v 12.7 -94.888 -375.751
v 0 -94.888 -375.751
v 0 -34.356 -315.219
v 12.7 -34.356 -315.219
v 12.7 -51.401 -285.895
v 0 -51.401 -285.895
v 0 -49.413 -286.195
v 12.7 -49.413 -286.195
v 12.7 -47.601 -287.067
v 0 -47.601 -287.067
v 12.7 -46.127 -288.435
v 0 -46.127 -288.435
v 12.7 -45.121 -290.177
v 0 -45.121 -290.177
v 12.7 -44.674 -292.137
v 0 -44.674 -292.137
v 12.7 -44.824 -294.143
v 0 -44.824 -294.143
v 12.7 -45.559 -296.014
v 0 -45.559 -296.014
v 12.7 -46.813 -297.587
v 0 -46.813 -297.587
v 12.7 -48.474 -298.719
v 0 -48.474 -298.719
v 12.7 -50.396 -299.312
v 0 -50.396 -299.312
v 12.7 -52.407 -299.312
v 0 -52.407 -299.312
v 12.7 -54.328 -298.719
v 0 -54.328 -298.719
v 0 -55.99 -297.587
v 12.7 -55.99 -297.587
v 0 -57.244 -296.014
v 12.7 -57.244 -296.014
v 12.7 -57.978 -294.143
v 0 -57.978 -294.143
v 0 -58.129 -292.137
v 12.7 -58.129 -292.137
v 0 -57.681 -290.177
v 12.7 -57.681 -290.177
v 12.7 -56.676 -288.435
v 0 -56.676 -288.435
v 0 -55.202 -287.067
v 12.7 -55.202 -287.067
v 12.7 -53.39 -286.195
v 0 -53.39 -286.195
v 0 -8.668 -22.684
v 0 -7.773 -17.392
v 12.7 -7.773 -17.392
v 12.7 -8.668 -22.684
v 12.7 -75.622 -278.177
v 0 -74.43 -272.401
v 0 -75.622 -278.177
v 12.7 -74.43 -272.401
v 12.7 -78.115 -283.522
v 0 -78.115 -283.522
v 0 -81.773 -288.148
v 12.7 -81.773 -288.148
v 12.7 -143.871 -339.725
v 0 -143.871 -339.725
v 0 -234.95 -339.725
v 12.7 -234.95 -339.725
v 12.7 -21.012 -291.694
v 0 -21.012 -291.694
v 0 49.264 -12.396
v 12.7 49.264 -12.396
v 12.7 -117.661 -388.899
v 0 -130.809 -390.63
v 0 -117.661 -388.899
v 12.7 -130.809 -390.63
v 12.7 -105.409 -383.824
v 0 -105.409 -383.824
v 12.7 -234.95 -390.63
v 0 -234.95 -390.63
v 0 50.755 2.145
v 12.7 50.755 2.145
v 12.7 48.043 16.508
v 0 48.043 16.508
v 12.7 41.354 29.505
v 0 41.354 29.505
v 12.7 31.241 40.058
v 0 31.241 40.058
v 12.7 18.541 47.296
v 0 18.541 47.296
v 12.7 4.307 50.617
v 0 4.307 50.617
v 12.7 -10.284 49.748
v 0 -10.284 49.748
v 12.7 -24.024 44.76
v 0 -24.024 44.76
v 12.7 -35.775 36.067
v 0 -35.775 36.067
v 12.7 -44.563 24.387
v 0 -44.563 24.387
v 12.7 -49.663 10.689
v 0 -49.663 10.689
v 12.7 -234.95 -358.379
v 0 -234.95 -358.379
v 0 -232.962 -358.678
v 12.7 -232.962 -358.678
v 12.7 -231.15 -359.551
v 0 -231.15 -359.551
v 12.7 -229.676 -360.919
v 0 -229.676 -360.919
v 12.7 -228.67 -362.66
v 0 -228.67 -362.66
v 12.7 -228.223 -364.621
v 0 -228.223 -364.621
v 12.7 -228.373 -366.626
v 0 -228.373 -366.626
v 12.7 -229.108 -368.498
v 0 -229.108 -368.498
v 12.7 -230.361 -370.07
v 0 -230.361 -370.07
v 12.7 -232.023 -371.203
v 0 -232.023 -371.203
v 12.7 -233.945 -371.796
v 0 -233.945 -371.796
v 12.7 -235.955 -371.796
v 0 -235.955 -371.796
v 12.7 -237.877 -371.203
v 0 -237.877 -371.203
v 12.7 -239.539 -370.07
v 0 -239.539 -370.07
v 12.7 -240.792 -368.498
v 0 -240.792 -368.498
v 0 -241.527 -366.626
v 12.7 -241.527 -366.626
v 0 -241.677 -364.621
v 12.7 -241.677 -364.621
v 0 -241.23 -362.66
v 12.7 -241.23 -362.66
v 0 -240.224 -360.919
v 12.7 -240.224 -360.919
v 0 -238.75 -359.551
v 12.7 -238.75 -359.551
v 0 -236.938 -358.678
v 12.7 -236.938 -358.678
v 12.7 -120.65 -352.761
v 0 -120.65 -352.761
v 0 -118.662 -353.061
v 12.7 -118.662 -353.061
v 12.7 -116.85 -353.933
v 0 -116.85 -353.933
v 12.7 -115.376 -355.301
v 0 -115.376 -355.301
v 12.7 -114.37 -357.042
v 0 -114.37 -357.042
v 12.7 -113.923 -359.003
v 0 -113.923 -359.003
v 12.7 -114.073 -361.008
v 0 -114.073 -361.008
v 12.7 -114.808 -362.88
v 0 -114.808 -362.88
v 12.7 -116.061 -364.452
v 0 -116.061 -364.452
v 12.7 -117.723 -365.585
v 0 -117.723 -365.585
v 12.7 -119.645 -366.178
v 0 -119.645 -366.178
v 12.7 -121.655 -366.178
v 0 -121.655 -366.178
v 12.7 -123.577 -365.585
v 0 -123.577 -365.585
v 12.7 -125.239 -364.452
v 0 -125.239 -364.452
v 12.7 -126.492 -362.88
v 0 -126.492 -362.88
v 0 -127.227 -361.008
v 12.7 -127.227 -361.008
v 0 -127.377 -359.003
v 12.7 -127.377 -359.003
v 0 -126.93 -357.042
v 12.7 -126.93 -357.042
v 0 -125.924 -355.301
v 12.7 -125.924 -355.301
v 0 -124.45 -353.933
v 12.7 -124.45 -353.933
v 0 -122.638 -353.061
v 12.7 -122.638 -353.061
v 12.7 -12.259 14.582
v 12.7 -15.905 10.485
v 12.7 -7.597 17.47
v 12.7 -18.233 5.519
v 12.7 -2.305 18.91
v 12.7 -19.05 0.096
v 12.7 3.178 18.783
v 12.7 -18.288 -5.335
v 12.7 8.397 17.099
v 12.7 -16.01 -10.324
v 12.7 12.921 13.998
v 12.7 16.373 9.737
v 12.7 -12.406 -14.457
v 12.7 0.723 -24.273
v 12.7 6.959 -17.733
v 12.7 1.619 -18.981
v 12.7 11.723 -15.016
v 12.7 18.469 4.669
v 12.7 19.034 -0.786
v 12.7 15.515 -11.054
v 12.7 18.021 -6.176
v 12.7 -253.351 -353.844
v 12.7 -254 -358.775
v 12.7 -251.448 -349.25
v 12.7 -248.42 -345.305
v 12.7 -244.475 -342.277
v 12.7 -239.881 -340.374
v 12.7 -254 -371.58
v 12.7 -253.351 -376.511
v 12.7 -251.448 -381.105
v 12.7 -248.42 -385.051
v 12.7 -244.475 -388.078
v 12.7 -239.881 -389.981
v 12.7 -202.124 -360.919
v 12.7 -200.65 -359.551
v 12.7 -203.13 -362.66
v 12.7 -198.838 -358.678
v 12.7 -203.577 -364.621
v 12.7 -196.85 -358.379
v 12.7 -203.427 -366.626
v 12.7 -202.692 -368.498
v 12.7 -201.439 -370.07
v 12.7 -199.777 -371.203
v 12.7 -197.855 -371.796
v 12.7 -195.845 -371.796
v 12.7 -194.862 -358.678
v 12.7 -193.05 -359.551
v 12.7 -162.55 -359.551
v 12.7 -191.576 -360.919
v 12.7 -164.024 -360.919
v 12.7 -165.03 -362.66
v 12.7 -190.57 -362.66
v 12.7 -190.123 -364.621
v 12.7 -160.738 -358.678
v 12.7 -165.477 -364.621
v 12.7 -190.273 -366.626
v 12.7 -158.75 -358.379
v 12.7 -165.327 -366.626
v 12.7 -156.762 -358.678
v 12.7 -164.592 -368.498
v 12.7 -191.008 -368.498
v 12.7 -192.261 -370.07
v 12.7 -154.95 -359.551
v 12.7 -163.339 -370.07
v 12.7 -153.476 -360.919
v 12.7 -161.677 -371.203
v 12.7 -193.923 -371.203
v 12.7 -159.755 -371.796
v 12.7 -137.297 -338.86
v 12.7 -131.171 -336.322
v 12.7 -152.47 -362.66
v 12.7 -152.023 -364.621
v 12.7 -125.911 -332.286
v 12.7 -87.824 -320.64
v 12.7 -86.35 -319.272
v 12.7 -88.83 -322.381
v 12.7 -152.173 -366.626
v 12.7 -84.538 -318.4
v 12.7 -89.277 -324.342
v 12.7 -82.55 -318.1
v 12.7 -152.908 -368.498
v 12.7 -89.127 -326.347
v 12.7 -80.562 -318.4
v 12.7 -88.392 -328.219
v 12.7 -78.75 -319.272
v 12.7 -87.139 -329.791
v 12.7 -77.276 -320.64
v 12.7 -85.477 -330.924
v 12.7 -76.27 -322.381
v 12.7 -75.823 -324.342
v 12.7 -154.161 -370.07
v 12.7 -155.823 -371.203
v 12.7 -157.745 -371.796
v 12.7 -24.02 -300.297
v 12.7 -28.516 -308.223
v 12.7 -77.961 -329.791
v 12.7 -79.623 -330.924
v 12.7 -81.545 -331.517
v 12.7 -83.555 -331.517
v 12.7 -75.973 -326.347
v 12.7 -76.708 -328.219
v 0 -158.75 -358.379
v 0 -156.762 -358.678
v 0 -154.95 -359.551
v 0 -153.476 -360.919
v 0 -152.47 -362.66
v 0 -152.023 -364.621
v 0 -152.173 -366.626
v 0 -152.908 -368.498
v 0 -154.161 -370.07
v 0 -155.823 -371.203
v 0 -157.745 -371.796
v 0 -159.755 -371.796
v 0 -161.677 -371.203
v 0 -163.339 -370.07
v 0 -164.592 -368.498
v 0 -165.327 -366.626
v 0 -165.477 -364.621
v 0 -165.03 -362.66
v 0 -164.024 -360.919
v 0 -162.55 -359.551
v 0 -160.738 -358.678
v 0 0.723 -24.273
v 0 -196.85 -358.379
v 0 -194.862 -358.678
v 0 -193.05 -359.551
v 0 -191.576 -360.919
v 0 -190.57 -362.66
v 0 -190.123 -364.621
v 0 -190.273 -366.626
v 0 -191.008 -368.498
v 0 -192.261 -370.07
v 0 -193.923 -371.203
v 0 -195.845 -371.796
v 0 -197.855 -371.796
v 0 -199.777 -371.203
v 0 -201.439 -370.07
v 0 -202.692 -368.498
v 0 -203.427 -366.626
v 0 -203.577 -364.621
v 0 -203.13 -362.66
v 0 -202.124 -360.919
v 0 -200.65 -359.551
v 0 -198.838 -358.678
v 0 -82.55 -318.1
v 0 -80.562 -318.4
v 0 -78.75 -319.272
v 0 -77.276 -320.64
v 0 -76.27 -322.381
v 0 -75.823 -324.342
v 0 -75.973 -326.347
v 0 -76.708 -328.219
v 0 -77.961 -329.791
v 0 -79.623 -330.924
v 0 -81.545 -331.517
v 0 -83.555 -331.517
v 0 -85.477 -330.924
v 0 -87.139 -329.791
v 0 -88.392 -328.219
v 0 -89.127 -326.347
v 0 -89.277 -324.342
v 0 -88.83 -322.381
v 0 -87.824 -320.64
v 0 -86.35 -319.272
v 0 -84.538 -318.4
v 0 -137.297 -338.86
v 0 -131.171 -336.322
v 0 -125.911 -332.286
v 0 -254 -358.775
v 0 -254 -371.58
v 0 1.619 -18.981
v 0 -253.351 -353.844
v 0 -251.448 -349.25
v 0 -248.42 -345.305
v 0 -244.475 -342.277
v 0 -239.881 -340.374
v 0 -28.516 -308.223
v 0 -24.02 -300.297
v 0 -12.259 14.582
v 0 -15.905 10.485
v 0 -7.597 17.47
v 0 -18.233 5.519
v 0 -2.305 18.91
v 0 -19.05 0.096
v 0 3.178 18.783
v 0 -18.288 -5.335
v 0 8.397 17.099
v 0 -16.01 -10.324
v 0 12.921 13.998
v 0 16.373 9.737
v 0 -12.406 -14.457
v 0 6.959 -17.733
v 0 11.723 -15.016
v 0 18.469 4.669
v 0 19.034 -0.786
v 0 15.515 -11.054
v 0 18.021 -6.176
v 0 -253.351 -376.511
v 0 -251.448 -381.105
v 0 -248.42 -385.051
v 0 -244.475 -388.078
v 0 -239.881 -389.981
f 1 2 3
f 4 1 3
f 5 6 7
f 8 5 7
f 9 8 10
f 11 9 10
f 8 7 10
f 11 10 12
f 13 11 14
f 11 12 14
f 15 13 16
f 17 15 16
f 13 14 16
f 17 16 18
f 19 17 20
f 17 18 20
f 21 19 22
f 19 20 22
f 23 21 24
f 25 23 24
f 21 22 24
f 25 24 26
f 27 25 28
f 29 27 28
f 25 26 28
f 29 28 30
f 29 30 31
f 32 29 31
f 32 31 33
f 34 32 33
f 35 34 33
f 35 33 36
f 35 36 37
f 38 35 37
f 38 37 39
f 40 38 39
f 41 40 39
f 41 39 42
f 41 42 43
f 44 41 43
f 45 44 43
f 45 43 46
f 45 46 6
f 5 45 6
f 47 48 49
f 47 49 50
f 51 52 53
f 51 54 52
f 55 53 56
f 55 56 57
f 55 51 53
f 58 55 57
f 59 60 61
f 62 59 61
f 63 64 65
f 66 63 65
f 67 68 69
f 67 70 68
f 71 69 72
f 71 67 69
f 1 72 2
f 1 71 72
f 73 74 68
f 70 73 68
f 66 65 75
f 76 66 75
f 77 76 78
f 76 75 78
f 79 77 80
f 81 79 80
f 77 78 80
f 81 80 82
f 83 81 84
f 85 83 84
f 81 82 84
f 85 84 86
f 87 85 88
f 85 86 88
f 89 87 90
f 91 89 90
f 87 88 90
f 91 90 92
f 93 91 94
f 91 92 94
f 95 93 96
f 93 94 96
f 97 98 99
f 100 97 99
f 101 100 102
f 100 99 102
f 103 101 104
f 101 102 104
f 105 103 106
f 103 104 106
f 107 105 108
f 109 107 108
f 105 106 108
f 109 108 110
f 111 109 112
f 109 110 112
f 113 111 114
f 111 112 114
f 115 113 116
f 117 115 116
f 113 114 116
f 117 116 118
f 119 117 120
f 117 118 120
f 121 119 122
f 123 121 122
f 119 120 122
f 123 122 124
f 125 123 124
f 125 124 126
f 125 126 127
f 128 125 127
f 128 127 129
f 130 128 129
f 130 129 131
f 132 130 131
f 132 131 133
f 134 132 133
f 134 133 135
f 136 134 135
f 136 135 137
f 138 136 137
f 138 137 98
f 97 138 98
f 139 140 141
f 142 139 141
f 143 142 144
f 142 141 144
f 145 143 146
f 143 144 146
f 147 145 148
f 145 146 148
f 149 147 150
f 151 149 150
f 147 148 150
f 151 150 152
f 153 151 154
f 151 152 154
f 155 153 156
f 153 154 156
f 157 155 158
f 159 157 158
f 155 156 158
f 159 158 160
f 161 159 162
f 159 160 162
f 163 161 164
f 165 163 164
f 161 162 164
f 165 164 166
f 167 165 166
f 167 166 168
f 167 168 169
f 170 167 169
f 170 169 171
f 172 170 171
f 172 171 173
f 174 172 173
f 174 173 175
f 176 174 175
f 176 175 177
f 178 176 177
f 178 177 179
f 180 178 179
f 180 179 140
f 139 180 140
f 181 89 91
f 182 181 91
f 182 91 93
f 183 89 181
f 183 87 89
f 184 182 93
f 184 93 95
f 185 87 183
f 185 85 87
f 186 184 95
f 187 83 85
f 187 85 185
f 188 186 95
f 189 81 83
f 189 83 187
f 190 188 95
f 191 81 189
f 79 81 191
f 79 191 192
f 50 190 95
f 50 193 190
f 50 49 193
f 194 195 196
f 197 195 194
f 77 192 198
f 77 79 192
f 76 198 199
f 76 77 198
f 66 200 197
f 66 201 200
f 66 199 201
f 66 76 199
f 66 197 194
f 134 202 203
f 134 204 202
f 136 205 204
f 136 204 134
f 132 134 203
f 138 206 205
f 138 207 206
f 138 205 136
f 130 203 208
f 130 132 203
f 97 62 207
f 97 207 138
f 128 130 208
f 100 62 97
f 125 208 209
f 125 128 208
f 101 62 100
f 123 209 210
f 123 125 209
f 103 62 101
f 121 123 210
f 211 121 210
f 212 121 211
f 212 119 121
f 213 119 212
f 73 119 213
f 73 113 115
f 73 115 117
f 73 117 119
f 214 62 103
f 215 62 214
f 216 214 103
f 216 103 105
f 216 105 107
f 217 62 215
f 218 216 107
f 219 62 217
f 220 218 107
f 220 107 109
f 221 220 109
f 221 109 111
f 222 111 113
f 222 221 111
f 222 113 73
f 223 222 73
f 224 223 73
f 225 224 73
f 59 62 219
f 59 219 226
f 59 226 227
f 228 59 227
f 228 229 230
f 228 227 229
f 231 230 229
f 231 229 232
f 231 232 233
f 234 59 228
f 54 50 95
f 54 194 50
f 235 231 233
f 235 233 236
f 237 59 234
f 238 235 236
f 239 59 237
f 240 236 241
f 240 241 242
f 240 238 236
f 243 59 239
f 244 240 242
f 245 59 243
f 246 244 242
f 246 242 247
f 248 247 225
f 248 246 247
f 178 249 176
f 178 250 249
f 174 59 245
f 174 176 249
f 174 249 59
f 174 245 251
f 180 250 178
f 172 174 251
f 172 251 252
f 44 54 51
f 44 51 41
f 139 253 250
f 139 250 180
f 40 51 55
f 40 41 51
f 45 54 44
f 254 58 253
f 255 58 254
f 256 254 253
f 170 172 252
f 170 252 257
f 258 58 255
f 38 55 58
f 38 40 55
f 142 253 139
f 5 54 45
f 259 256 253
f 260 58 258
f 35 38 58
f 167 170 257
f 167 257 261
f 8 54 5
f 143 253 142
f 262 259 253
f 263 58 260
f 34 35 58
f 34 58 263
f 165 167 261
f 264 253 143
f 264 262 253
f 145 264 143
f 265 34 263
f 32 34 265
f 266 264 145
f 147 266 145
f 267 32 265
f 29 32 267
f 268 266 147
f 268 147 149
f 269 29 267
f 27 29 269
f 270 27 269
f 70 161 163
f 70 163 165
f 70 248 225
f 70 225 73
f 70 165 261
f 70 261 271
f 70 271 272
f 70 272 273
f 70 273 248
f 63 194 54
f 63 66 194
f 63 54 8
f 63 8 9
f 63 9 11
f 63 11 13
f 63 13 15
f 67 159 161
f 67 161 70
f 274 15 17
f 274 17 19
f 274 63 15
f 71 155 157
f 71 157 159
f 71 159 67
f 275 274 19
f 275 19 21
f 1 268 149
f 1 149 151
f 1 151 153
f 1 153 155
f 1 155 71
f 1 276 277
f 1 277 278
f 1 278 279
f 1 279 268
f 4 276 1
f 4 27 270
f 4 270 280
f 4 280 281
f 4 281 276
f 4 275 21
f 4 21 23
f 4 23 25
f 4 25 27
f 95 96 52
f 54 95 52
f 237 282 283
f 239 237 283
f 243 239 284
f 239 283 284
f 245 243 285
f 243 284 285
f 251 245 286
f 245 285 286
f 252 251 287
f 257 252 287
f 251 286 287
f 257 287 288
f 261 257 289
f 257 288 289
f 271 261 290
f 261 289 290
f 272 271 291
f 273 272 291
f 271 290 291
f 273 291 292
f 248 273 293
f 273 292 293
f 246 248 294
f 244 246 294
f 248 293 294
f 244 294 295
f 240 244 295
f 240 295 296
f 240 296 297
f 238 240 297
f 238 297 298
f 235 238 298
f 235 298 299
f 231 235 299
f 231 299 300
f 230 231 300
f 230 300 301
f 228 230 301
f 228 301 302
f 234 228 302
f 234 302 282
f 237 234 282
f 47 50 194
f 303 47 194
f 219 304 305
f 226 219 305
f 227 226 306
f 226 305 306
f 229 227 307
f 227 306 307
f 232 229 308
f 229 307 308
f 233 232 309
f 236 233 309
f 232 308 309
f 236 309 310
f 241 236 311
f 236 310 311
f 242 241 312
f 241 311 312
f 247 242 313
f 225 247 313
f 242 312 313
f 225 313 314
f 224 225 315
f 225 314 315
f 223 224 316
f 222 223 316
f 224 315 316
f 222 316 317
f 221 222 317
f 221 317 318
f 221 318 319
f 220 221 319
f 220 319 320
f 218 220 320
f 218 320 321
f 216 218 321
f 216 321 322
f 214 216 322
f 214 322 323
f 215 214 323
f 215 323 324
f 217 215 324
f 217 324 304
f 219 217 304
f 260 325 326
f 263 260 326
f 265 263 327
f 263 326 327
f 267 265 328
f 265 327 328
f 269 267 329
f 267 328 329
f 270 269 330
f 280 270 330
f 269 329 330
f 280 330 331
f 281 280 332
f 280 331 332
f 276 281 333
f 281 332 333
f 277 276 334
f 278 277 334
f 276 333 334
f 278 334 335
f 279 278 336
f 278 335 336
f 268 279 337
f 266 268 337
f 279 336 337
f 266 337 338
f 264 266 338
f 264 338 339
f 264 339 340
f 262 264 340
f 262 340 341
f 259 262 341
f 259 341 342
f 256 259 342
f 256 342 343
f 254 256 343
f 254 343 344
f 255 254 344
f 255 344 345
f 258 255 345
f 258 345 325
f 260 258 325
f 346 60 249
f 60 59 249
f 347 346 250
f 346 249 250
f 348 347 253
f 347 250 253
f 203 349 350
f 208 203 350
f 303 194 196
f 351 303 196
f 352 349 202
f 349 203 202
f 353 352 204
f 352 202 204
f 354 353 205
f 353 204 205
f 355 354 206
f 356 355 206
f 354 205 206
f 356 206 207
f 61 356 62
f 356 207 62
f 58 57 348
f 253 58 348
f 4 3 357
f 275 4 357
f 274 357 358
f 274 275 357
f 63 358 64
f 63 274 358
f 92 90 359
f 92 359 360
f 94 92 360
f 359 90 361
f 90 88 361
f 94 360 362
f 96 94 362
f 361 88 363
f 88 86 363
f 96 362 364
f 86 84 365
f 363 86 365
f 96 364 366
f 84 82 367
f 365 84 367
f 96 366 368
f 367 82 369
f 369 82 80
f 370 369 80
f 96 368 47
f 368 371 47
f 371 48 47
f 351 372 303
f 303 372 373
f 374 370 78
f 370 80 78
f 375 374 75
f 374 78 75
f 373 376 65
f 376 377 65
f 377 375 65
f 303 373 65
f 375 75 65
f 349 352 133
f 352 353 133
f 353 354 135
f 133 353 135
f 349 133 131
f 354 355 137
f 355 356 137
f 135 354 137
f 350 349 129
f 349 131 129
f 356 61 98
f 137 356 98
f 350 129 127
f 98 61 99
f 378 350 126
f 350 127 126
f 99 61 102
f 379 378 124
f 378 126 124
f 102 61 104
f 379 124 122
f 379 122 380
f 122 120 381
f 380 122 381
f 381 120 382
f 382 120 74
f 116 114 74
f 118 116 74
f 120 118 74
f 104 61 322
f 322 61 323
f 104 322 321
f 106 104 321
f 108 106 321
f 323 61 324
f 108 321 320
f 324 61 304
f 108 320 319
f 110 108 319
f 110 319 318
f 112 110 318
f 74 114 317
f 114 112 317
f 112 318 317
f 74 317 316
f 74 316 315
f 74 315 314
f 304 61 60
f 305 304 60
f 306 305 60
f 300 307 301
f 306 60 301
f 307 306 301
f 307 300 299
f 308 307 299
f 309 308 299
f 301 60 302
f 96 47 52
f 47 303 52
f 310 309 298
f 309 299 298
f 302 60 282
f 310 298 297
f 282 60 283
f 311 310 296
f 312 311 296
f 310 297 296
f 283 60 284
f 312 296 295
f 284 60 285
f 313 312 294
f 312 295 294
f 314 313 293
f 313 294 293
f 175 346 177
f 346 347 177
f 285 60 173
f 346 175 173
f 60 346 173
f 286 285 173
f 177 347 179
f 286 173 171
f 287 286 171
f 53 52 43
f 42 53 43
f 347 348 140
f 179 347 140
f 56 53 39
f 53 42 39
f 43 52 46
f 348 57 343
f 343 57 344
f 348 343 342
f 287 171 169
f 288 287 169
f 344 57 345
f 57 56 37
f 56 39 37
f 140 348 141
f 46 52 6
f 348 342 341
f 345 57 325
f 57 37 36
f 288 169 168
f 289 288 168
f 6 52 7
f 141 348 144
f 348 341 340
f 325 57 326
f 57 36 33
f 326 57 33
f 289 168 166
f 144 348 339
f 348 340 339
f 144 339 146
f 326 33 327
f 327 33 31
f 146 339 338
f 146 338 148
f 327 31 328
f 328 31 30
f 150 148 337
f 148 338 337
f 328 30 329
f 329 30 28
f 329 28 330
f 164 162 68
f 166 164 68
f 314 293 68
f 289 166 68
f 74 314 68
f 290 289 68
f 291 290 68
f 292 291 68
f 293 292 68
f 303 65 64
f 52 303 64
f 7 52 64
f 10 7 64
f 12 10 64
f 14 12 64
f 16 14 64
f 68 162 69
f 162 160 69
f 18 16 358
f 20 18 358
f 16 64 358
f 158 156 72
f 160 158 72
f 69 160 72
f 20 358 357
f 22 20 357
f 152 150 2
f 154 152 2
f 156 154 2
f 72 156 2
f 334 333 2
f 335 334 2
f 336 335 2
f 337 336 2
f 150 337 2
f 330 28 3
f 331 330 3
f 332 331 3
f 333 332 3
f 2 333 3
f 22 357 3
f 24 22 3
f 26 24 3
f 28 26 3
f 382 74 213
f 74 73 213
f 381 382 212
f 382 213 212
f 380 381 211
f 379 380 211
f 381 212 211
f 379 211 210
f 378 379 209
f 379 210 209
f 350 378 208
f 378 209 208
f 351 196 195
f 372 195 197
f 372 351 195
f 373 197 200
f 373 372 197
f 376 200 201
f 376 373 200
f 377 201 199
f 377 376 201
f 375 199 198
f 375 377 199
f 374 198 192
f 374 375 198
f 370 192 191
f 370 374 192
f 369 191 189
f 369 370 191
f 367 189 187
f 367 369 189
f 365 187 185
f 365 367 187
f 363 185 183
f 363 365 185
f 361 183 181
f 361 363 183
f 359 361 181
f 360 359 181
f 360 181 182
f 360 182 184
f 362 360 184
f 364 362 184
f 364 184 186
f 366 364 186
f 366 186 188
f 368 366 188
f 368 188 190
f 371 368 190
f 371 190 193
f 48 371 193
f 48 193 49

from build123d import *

# Parameters (mm, degrees)
SKETCH1_R                   = 19.05
BOSS_EXTRUDE1_DEPTH         = 12.7
FILLET1_R                   = 25.4
FILLET2_R                   = 50.8
F_1_2_CLEARANCE_HOLE1_D     = 13.49248
F_1_2_CLEARANCE_HOLE1_DEPTH = 38.1
F_1_2_CLEARANCE_HOLE1_TIP   = 4.053549943
FILLET3_R                   = 19.05
CUT_EXTRUDE1_DEPTH          = 13.7
F_1_2_CLEARANCE_HOLE2_D     = 13.49248


with BuildPart() as part:
    # Sketch1 → Boss-Extrude1 (new body)
    with BuildSketch(Plane(origin=(0, 0, 0), x_dir=(0, 0, -1), z_dir=(1, 0, 0))):
        with BuildLine():
            Line((390.630407277, -109.766978243), (305.29908743, -24.435658396))
            Line((305.29908743, -24.435658396), (12.395871839, 49.264412727))
            ThreePointArc((12.395871839, 49.264412727), (-49.470959365, 11.544010545), (-10.688712274, -49.662777107))
            Line((-10.688712274, -49.662777107), (281.610658396, -75.235658396))
            Line((281.610658396, -75.235658396), (339.725, -133.35))
            Line((339.725, -133.35), (339.725, -254))
            Line((339.725, -254), (390.630407277, -254))
            Line((390.630407277, -254), (390.630407277, -109.766978243))
        make_face()
        Circle(SKETCH1_R, mode=Mode.SUBTRACT)
    extrude(amount=BOSS_EXTRUDE1_DEPTH)

    # Fillet1
    fillet1_edges = [part.edges().sort_by_distance(p)[0] for p in [
        (6.35, -133.35, -339.725),
        (6.35, -75.235658396, -281.610658396),
    ]]
    fillet(fillet1_edges, radius=FILLET1_R)

    # Fillet2
    fillet2_edges = [part.edges().sort_by_distance(p)[0] for p in [
        (6.35, -24.435658396, -305.29908743),
        (6.35, -109.766978243, -390.630407277),
    ]]
    fillet(fillet2_edges, radius=FILLET2_R)

    # 1/2 Clearance Hole1
    with Locations(Plane(origin=(12.7, 0, 0), x_dir=(0, 0, -1), z_dir=(1, 0, 0))):
        with Locations((365.125, -234.95), (365.125, -196.85), (365.125, -158.75), (359.5071206, -120.65), (324.846024484, -82.55)):
            Hole(F_1_2_CLEARANCE_HOLE1_D / 2, depth=F_1_2_CLEARANCE_HOLE1_DEPTH)
            with Locations((0, 0, -(F_1_2_CLEARANCE_HOLE1_DEPTH + F_1_2_CLEARANCE_HOLE1_TIP / 2))):  # 118° drill point
                Cone(0, F_1_2_CLEARANCE_HOLE1_D / 2, F_1_2_CLEARANCE_HOLE1_TIP, mode=Mode.SUBTRACT)

    # Fillet3
    fillet3_edges = [part.edges().sort_by_distance(p)[0] for p in [
        (6.35, -254, -390.630407277),
        (6.35, -254, -339.725),
    ]]
    fillet(fillet3_edges, radius=FILLET3_R)

    # Sketch4 → Cut-Extrude1 (cut, through all)
    with BuildSketch(Plane(origin=(12.7, 0, 0), x_dir=(0, 0, -1), z_dir=(1, 0, 0))):
        Polygon((23.478806451, -3.972505995), (24.27330765, 0.723255295), (14.88178507, 2.312257693), (13.292782672, -7.079264887), (22.684305252, -8.668267285), align=None)
    extrude(amount=-CUT_EXTRUDE1_DEPTH, mode=Mode.SUBTRACT)

    # 1/2 Clearance Hole2 (through all)
    with Locations(Plane(origin=(12.7, 0, 0), x_dir=(0, 0, -1), z_dir=(1, 0, 0))):
        with Locations((292.641331438, -51.40137192)):
            Hole(F_1_2_CLEARANCE_HOLE2_D / 2)


solid = part.part
